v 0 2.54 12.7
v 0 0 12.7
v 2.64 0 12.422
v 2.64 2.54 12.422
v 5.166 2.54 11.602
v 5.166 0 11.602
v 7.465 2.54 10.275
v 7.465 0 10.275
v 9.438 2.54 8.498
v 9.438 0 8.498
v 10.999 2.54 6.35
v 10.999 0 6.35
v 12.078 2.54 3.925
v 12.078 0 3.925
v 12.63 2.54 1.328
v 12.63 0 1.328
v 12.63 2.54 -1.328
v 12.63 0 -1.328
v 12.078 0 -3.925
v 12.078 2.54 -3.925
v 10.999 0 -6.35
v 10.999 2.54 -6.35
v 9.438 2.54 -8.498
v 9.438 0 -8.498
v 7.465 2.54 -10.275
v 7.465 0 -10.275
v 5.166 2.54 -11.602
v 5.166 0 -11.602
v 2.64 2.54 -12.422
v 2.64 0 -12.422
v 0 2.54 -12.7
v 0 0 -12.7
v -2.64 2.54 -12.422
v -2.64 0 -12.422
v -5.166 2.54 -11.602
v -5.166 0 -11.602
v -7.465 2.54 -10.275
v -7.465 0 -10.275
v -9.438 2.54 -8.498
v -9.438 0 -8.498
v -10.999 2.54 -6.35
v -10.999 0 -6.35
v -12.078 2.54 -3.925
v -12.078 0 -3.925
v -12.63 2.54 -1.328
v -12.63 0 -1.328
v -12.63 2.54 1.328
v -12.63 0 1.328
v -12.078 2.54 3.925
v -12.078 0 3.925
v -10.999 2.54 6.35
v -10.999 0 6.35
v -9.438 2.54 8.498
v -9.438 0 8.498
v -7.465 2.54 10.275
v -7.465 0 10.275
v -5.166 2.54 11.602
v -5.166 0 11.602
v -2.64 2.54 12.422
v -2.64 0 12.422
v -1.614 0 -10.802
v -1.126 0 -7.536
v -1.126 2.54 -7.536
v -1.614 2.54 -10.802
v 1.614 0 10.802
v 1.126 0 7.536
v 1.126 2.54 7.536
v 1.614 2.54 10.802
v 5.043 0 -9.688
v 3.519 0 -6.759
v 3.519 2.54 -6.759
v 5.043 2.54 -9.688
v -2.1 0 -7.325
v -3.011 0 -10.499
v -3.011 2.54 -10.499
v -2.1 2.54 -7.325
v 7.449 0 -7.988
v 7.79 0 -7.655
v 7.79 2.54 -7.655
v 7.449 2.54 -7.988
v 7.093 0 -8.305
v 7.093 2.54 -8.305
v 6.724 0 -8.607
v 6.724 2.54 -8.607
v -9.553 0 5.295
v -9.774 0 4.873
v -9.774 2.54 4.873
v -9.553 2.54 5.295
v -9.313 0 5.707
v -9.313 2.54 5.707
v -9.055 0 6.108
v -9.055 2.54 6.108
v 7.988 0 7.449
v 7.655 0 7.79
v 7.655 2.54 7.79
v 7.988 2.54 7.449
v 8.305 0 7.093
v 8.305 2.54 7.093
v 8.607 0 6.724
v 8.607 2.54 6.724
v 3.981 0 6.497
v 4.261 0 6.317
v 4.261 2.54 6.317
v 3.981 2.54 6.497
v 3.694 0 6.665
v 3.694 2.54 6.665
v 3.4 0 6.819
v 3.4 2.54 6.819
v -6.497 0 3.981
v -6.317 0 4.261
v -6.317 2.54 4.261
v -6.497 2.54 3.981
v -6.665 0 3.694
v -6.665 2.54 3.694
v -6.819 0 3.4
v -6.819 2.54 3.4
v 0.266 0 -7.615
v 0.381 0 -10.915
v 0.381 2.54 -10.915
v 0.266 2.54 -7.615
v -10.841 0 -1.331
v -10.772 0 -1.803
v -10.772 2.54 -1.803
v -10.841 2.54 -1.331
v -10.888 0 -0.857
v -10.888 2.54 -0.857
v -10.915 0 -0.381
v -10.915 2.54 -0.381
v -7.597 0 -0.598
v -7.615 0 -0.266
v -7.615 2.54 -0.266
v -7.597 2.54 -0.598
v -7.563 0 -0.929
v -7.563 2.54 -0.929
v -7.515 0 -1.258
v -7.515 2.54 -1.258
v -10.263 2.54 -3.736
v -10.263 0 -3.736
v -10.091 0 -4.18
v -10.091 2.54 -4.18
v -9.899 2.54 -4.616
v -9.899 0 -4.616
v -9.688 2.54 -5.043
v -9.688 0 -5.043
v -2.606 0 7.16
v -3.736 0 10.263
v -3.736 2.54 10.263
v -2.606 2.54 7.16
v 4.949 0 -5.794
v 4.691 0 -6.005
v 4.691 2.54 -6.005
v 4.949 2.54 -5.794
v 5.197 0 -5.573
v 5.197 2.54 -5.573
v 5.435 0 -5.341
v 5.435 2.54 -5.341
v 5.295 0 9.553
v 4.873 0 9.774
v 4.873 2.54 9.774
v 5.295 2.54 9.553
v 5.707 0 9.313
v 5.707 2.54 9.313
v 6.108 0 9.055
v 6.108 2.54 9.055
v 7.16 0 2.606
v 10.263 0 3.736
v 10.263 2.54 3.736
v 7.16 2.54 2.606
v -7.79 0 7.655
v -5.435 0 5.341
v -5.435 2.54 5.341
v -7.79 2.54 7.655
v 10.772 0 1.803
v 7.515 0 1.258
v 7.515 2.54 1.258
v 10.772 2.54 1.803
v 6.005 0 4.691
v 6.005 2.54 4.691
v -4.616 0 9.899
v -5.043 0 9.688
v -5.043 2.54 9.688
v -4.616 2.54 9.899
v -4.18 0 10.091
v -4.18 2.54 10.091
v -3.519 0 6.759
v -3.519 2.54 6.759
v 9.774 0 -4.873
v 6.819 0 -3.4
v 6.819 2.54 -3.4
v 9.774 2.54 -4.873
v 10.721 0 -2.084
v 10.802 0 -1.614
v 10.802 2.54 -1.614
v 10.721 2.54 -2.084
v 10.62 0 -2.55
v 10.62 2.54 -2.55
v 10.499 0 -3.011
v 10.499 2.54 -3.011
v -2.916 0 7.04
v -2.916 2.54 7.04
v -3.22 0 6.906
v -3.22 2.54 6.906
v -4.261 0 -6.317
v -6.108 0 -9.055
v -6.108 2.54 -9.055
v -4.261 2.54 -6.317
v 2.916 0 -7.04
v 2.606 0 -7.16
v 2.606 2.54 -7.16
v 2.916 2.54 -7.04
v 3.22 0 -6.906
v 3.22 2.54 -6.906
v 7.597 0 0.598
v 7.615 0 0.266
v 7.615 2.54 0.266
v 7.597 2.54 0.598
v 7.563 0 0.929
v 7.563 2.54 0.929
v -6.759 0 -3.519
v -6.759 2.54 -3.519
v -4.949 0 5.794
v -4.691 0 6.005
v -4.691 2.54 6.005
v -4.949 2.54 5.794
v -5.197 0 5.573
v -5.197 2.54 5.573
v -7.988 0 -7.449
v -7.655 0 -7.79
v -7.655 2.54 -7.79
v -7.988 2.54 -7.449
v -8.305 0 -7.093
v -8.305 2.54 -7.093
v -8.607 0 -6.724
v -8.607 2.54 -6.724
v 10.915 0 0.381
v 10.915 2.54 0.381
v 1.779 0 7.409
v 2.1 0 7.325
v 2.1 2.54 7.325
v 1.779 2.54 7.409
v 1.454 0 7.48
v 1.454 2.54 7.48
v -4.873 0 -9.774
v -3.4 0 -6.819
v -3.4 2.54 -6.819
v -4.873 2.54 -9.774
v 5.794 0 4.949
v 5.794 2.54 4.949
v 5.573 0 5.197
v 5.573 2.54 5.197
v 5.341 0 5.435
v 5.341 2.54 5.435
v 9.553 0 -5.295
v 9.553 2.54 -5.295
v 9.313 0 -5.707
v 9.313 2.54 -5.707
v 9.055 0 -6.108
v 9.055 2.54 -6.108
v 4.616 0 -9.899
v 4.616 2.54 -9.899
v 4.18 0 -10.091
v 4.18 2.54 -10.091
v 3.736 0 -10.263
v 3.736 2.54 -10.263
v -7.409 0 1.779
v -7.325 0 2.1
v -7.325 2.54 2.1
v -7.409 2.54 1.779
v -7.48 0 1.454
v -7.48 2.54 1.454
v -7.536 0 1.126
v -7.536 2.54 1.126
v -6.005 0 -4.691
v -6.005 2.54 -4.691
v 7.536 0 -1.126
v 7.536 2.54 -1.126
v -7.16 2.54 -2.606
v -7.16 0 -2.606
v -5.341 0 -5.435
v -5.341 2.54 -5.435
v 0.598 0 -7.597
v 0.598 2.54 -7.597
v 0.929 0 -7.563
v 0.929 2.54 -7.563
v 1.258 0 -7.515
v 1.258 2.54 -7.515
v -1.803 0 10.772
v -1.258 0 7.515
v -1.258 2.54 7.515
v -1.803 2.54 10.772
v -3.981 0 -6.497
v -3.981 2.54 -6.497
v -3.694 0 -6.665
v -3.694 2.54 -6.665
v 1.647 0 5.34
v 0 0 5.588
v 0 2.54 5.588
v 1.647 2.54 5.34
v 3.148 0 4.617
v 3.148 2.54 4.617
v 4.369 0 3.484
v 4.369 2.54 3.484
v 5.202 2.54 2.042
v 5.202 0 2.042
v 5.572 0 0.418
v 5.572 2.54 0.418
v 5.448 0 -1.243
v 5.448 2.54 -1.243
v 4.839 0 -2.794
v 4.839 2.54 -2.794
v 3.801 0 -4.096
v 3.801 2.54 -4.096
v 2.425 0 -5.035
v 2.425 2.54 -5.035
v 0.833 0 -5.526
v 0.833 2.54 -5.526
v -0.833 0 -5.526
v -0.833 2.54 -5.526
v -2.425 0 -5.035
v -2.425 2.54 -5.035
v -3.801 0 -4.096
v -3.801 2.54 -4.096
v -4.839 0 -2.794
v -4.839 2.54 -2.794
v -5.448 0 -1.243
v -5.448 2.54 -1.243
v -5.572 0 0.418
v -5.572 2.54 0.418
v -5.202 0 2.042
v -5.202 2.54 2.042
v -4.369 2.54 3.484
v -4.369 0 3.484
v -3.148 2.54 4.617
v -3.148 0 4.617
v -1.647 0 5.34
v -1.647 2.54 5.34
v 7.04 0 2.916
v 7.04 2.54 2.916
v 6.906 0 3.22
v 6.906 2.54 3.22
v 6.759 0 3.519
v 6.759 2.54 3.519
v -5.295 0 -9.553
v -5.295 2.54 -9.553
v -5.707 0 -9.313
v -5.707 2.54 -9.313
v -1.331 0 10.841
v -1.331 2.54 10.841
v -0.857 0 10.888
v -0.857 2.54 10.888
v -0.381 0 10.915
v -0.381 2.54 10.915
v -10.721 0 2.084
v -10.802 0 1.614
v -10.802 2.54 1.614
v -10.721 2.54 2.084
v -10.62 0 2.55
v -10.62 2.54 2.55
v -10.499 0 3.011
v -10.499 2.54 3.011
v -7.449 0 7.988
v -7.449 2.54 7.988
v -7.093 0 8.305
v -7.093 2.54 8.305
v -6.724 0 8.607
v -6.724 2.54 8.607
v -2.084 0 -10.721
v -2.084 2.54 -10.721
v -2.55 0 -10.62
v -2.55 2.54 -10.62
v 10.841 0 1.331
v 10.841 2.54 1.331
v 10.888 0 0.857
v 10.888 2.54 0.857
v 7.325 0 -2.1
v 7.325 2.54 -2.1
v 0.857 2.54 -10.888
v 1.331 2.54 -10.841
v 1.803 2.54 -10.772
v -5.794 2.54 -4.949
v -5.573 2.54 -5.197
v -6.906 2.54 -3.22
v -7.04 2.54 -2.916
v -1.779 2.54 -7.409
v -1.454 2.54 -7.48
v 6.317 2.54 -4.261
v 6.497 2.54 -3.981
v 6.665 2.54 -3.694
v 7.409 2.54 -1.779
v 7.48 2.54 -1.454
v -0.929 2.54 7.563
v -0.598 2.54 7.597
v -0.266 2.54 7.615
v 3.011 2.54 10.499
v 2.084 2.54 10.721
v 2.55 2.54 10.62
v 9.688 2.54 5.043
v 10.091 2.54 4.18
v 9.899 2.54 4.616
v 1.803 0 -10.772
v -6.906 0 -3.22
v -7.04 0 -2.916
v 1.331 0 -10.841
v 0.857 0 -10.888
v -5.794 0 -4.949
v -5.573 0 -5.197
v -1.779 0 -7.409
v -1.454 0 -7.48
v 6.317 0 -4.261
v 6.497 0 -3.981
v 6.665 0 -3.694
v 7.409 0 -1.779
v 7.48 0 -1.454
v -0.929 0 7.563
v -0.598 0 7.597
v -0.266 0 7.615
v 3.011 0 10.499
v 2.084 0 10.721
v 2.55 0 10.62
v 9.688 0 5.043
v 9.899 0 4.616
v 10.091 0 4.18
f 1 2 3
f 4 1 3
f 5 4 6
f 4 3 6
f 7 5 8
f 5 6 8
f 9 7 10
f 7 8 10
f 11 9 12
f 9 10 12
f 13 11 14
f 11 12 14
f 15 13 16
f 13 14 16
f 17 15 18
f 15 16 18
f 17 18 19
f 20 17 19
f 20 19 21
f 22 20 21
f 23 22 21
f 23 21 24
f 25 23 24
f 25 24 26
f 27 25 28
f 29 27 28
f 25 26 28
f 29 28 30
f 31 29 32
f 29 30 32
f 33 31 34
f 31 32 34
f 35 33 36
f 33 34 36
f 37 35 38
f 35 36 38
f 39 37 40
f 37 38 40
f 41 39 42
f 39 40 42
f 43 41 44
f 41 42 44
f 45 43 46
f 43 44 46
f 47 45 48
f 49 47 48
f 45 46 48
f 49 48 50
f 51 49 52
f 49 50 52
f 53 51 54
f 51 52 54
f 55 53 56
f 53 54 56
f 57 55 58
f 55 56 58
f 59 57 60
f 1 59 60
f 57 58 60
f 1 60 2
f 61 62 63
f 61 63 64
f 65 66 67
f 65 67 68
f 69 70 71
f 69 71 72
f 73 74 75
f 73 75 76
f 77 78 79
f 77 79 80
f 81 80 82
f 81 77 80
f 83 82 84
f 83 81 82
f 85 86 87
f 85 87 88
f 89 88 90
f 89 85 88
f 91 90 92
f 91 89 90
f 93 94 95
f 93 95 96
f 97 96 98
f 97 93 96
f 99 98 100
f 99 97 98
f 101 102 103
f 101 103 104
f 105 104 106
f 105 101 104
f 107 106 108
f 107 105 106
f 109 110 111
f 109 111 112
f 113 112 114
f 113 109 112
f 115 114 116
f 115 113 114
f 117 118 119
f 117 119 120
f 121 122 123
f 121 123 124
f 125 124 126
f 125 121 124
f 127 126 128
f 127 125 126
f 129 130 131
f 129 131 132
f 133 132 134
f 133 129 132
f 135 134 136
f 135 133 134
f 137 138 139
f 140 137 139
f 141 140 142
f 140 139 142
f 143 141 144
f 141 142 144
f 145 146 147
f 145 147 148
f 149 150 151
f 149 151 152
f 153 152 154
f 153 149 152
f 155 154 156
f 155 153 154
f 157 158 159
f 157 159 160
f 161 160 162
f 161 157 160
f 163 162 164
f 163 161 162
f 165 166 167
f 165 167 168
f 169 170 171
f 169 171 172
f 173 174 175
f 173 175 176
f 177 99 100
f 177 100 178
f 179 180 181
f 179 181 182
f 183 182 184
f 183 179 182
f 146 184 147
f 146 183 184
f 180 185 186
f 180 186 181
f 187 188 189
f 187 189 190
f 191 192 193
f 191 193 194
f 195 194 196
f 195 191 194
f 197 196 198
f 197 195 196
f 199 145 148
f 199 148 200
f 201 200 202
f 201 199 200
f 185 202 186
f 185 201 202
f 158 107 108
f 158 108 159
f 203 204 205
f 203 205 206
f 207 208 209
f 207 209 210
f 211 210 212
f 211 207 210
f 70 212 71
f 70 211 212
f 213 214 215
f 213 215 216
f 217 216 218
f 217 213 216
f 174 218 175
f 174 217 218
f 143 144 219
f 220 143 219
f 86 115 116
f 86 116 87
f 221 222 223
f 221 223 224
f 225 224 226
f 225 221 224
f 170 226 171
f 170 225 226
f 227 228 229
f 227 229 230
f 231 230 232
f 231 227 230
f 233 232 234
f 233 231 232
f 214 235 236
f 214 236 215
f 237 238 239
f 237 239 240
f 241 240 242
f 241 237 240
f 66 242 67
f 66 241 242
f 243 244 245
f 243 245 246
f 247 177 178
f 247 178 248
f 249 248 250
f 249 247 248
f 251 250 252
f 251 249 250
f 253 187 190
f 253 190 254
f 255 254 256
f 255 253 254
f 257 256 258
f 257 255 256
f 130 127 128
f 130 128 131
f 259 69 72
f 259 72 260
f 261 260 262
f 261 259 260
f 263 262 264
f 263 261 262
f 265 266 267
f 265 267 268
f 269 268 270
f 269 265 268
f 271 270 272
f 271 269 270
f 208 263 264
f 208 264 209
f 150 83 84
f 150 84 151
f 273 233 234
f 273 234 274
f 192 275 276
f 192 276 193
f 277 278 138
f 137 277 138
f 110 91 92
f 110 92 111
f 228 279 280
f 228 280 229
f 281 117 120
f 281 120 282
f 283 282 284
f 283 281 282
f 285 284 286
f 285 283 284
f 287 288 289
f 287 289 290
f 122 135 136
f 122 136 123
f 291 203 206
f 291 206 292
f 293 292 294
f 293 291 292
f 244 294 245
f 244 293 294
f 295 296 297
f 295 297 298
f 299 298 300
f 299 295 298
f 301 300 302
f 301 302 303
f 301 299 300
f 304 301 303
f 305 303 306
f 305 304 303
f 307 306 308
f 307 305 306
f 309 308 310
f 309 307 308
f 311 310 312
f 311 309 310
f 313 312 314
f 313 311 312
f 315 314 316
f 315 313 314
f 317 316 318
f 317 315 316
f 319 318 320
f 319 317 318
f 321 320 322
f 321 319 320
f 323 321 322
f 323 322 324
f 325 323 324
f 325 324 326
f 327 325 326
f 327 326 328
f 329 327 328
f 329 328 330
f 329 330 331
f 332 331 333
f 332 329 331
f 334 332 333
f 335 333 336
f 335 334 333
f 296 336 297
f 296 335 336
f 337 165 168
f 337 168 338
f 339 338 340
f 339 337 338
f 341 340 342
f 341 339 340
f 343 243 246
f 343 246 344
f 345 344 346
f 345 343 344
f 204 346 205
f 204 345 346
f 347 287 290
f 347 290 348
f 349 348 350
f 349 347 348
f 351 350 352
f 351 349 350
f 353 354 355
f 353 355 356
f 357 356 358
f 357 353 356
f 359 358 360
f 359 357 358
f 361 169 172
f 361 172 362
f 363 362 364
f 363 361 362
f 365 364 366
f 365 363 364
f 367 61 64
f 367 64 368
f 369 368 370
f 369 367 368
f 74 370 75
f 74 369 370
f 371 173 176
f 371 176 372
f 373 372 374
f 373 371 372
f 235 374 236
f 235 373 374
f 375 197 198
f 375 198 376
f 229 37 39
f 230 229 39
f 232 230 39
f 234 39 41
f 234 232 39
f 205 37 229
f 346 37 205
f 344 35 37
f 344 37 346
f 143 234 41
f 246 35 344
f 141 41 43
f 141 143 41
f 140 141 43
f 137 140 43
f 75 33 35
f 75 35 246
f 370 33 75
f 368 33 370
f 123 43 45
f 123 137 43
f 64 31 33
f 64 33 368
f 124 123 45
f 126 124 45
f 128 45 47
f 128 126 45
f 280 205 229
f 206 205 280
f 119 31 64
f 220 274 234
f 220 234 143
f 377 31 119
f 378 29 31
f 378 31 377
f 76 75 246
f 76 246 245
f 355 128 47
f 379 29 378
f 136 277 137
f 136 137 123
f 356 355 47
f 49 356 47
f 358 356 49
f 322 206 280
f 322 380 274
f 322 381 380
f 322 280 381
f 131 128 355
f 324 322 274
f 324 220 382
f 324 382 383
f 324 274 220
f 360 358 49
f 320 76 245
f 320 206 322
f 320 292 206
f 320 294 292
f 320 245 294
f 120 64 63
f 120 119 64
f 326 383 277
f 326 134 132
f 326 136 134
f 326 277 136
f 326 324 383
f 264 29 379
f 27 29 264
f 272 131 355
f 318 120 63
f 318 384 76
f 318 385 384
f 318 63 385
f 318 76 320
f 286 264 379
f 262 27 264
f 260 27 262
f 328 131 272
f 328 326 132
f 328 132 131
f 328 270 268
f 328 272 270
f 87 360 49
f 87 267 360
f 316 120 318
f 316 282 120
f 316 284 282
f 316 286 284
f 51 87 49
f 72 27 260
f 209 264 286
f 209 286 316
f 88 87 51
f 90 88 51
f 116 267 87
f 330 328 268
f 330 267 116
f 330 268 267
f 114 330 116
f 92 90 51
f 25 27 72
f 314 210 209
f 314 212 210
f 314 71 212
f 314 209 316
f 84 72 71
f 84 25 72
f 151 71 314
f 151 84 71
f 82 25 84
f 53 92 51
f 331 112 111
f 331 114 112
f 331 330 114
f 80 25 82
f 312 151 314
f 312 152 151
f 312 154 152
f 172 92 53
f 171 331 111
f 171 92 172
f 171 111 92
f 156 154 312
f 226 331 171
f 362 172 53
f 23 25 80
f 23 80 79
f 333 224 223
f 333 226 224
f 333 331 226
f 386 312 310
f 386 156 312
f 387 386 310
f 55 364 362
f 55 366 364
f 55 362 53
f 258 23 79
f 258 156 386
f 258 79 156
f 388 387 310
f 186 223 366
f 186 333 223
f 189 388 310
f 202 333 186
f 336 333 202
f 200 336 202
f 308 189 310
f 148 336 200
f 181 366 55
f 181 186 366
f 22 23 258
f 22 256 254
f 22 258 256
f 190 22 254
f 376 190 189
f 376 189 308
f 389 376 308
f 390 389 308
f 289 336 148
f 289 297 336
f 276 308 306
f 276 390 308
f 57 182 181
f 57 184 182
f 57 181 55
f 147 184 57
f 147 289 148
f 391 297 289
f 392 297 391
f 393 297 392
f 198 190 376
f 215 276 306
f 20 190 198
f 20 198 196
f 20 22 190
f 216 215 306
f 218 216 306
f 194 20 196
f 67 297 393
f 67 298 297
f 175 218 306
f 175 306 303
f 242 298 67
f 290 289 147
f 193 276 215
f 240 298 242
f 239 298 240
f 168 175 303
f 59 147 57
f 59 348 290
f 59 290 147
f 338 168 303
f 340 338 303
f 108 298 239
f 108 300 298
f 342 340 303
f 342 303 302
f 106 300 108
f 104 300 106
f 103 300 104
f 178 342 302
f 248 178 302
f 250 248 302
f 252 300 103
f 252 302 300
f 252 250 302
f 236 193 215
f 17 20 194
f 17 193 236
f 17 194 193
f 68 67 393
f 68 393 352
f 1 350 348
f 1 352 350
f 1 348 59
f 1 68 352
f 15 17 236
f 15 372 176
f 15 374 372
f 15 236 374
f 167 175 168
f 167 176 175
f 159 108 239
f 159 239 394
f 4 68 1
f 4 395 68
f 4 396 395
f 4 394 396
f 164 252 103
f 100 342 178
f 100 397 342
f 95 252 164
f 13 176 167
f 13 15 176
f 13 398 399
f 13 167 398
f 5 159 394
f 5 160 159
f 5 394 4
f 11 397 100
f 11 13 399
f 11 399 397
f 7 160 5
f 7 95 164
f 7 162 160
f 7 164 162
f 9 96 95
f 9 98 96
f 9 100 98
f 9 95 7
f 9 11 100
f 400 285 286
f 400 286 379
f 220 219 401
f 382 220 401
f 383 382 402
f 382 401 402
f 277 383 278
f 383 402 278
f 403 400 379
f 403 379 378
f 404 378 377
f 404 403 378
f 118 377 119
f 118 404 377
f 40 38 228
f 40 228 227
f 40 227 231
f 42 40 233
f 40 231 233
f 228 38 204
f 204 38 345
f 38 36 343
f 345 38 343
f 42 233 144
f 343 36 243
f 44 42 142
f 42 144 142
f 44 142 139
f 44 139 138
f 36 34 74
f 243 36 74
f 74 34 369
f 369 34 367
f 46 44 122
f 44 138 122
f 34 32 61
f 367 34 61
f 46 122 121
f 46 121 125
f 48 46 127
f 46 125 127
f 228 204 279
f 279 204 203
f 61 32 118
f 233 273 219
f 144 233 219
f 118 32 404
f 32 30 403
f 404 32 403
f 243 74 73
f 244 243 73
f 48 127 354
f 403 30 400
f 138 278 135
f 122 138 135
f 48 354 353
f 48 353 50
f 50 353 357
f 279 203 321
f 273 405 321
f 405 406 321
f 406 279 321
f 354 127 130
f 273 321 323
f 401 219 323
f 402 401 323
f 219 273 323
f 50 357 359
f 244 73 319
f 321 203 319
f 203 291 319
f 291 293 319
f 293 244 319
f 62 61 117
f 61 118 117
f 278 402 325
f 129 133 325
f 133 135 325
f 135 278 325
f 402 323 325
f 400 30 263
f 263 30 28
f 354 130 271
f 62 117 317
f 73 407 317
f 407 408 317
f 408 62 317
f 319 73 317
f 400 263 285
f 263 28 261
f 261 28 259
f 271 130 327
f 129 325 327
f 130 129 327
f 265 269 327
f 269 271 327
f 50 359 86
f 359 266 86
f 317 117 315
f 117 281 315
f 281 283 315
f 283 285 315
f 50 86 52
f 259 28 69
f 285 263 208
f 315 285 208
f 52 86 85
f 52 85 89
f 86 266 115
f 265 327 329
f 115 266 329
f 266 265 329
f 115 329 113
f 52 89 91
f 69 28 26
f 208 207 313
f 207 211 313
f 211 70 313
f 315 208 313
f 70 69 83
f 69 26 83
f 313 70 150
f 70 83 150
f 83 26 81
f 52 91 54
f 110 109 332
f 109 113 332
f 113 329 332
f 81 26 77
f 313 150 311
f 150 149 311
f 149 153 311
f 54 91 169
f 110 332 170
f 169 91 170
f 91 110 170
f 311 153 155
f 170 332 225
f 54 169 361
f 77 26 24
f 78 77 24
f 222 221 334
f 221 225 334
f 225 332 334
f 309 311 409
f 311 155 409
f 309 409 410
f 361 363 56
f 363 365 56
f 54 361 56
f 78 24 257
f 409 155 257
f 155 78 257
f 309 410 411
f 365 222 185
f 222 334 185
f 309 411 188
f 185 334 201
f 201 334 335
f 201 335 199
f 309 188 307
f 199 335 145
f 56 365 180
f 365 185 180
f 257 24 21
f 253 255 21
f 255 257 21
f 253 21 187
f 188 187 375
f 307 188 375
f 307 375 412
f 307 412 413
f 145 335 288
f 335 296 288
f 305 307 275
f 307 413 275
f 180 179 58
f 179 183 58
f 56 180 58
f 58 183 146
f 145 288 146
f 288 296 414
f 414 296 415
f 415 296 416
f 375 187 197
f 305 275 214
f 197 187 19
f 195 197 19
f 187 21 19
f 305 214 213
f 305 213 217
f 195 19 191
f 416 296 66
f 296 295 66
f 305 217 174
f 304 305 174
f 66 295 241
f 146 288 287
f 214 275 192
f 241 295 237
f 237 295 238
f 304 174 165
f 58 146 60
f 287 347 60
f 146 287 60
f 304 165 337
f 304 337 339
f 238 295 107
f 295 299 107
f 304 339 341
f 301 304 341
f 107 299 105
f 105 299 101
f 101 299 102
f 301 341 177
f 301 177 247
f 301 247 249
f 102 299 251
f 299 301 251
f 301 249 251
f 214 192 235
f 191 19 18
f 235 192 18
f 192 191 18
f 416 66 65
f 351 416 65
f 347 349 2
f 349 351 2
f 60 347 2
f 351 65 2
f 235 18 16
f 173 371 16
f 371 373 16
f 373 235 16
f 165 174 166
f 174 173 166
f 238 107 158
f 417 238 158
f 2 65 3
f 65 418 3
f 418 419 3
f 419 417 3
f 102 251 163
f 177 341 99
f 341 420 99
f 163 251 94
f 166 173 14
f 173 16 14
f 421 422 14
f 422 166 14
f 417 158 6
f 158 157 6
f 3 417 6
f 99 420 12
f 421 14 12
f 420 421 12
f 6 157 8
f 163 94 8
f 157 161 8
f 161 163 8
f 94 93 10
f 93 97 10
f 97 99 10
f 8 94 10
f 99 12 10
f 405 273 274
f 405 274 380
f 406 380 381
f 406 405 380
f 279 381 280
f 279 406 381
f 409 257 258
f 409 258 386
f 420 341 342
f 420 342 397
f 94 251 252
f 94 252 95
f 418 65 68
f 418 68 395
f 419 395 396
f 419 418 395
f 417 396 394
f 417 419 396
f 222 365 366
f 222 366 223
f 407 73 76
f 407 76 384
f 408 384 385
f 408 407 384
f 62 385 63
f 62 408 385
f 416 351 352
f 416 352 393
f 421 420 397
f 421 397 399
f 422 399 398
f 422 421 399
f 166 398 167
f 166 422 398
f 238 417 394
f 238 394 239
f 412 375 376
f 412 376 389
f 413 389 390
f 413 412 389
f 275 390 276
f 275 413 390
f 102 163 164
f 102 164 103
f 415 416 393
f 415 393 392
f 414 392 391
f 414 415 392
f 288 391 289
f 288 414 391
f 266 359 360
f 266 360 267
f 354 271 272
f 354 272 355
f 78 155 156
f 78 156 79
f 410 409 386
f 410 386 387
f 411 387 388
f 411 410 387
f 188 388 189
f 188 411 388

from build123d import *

# Parameters (mm, degrees)
SKETCH1_R           = 12.7
SKETCH1_R_2         = 5.588
BOSS_EXTRUDE1_DEPTH = 2.54


with BuildPart() as part:
    # Sketch1 → Boss-Extrude1 (new body)
    with BuildSketch(Plane(origin=(0, 0, 0), x_dir=(1, 0, 0), z_dir=(0, 1, 0))):
        with Locations(Location((0, 0, 0), (0, 0, 270))):
            Circle(SKETCH1_R)
        with Locations(Location((0, 0, 0), (0, 0, 270))):
            Circle(SKETCH1_R_2, mode=Mode.SUBTRACT)
        with BuildLine():
            Line((-9.68793232, 5.043218354), (-6.759022549, 3.518524433))
            ThreePointArc((-6.759022549, 3.518524433), (-6.974673471, 3.068929777), (-7.16045777, 2.606193492))
            Line((-7.16045777, 2.606193492), (-10.263322804, 3.735544005))
            ThreePointArc((-10.263322804, 3.735544005), (-9.997031975, 4.398799347), (-9.68793232, 5.043218354))
        make_face(mode=Mode.SUBTRACT)
        with BuildLine():
            Line((-8.606653451, 6.724254634), (-6.004641942, 4.691340442))
            ThreePointArc((-6.004641942, 4.691340442), (-5.684957198, 5.074018295), (-5.340928594, 5.434968423))
            Line((-5.340928594, 5.434968423), (-7.655330985, 7.790121406))
            ThreePointArc((-7.655330985, 7.790121406), (-8.14843865, 7.272759556), (-8.606653451, 6.724254634))
        make_face(mode=Mode.SUBTRACT)
        with BuildLine():
            Line((-6.107504892, 9.054748367), (-4.261049924, 6.317266303))
            ThreePointArc((-4.261049924, 6.317266303), (-3.838757705, 6.58242655), (-3.400027336, 6.819399835))
            Line((-3.400027336, 6.819399835), (-4.873372515, 9.774473097))
            ThreePointArc((-4.873372515, 9.774473097), (-5.502219377, 9.434811388), (-6.107504892, 9.054748367))
        make_face(mode=Mode.SUBTRACT)
        with BuildLine():
            Line((-3.0105112, 10.498900243), (-2.100356651, 7.324814123))
            ThreePointArc((-2.100356651, 7.324814123), (-1.616793862, 7.446501031), (-1.126307713, 7.536300879))
            Line((-1.126307713, 7.536300879), (-1.614374388, 10.80203126))
            ThreePointArc((-1.614374388, 10.80203126), (-2.317404535, 10.673318145), (-3.0105112, 10.498900243))
        make_face(mode=Mode.SUBTRACT)
        with BuildLine():
            Line((0.381172303, 10.915346613), (0.265934165, 7.615358102))
            ThreePointArc((0.265934165, 7.615358102), (0.763433029, 7.581660109), (1.257662757, 7.515496284))
            Line((1.257662757, 7.515496284), (1.802649951, 10.77221134))
            ThreePointArc((1.802649951, 10.77221134), (1.094254009, 10.867046156), (0.381172303, 10.915346613))
        make_face(mode=Mode.SUBTRACT)
        with BuildLine():
            Line((3.735544005, 10.263322804), (2.606193492, 7.16045777))
            ThreePointArc((2.606193492, 7.16045777), (3.068929777, 6.974673471), (3.518524433, 6.759022549))
            Line((3.518524433, 6.759022549), (5.043218354, 9.68793232))
            ThreePointArc((5.043218354, 9.68793232), (4.398799347, 9.997031975), (3.735544005, 10.263322804))
        make_face(mode=Mode.SUBTRACT)
        with BuildLine():
            Line((6.724254634, 8.606653451), (4.691340442, 6.004641942))
            ThreePointArc((4.691340442, 6.004641942), (5.074018295, 5.684957198), (5.434968423, 5.340928594))
            Line((5.434968423, 5.340928594), (7.790121406, 7.655330985))
            ThreePointArc((7.790121406, 7.655330985), (7.272759556, 8.14843865), (6.724254634, 8.606653451))
        make_face(mode=Mode.SUBTRACT)
        with BuildLine():
            Line((9.054748367, 6.107504892), (6.317266303, 4.261049924))
            ThreePointArc((6.317266303, 4.261049924), (6.58242655, 3.838757705), (6.819399835, 3.400027336))
            Line((6.819399835, 3.400027336), (9.774473097, 4.873372515))
            ThreePointArc((9.774473097, 4.873372515), (9.434811388, 5.502219377), (9.054748367, 6.107504892))
        make_face(mode=Mode.SUBTRACT)
        with BuildLine():
            Line((10.498900243, 3.0105112), (7.324814123, 2.100356651))
            ThreePointArc((7.324814123, 2.100356651), (7.446501031, 1.616793862), (7.536300879, 1.126307713))
            Line((7.536300879, 1.126307713), (10.80203126, 1.614374388))
            ThreePointArc((10.80203126, 1.614374388), (10.673318145, 2.317404535), (10.498900243, 3.0105112))
        make_face(mode=Mode.SUBTRACT)
        with BuildLine():
            Line((10.915346613, -0.381172303), (7.615358102, -0.265934165))
            ThreePointArc((7.615358102, -0.265934165), (7.581660109, -0.763433029), (7.515496284, -1.257662757))
            Line((7.515496284, -1.257662757), (10.77221134, -1.802649951))
            ThreePointArc((10.77221134, -1.802649951), (10.867046156, -1.094254009), (10.915346613, -0.381172303))
        make_face(mode=Mode.SUBTRACT)
        with BuildLine():
            Line((10.263322804, -3.735544005), (7.16045777, -2.606193492))
            ThreePointArc((7.16045777, -2.606193492), (6.974673471, -3.068929777), (6.759022549, -3.518524433))
            Line((6.759022549, -3.518524433), (9.68793232, -5.043218354))
            ThreePointArc((9.68793232, -5.043218354), (9.997031975, -4.398799347), (10.263322804, -3.735544005))
        make_face(mode=Mode.SUBTRACT)
        with BuildLine():
            Line((8.606653451, -6.724254634), (6.004641942, -4.691340442))
            ThreePointArc((6.004641942, -4.691340442), (5.684957198, -5.074018295), (5.340928594, -5.434968423))
            Line((5.340928594, -5.434968423), (7.655330985, -7.790121406))
            ThreePointArc((7.655330985, -7.790121406), (8.14843865, -7.272759556), (8.606653451, -6.724254634))
        make_face(mode=Mode.SUBTRACT)
        with BuildLine():
            Line((6.107504892, -9.054748367), (4.261049924, -6.317266303))
            ThreePointArc((4.261049924, -6.317266303), (3.838757705, -6.58242655), (3.400027336, -6.819399835))
            Line((3.400027336, -6.819399835), (4.873372515, -9.774473097))
            ThreePointArc((4.873372515, -9.774473097), (5.502219377, -9.434811388), (6.107504892, -9.054748367))
        make_face(mode=Mode.SUBTRACT)
        with BuildLine():
            Line((3.0105112, -10.498900243), (2.100356651, -7.324814123))
            ThreePointArc((2.100356651, -7.324814123), (1.616793862, -7.446501031), (1.126307713, -7.536300879))
            Line((1.126307713, -7.536300879), (1.614374388, -10.80203126))
            ThreePointArc((1.614374388, -10.80203126), (2.317404535, -10.673318145), (3.0105112, -10.498900243))
        make_face(mode=Mode.SUBTRACT)
        with BuildLine():
            Line((-0.381172303, -10.915346613), (-0.265934165, -7.615358102))
            ThreePointArc((-0.265934165, -7.615358102), (-0.763433029, -7.581660109), (-1.257662757, -7.515496284))
            Line((-1.257662757, -7.515496284), (-1.802649951, -10.77221134))
            ThreePointArc((-1.802649951, -10.77221134), (-1.094254009, -10.867046156), (-0.381172303, -10.915346613))
        make_face(mode=Mode.SUBTRACT)
        with BuildLine():
            Line((-3.735544005, -10.263322804), (-2.606193492, -7.16045777))
            ThreePointArc((-2.606193492, -7.16045777), (-3.068929777, -6.974673471), (-3.518524433, -6.759022549))
            Line((-3.518524433, -6.759022549), (-5.043218354, -9.68793232))
            ThreePointArc((-5.043218354, -9.68793232), (-4.398799347, -9.997031975), (-3.735544005, -10.263322804))
        make_face(mode=Mode.SUBTRACT)
        with BuildLine():
            Line((-6.724254634, -8.606653451), (-4.691340442, -6.004641942))
            ThreePointArc((-4.691340442, -6.004641942), (-5.074018295, -5.684957198), (-5.434968423, -5.340928594))
            Line((-5.434968423, -5.340928594), (-7.790121406, -7.655330985))
            ThreePointArc((-7.790121406, -7.655330985), (-7.272759556, -8.14843865), (-6.724254634, -8.606653451))
        make_face(mode=Mode.SUBTRACT)
        with BuildLine():
            Line((-9.054748367, -6.107504892), (-6.317266303, -4.261049924))
            ThreePointArc((-6.317266303, -4.261049924), (-6.58242655, -3.838757705), (-6.819399835, -3.400027336))
            Line((-6.819399835, -3.400027336), (-9.774473097, -4.873372515))
            ThreePointArc((-9.774473097, -4.873372515), (-9.434811388, -5.502219377), (-9.054748367, -6.107504892))
        make_face(mode=Mode.SUBTRACT)
        with BuildLine():
            Line((-10.498900243, -3.0105112), (-7.324814123, -2.100356651))
            ThreePointArc((-7.324814123, -2.100356651), (-7.446501031, -1.616793862), (-7.536300879, -1.126307713))
            Line((-7.536300879, -1.126307713), (-10.80203126, -1.614374388))
            ThreePointArc((-10.80203126, -1.614374388), (-10.673318145, -2.317404535), (-10.498900243, -3.0105112))
        make_face(mode=Mode.SUBTRACT)
        with BuildLine():
            Line((-10.915346613, 0.381172303), (-7.615358102, 0.265934165))
            ThreePointArc((-7.615358102, 0.265934165), (-7.581660109, 0.763433029), (-7.515496284, 1.257662757))
            Line((-7.515496284, 1.257662757), (-10.77221134, 1.802649951))
            ThreePointArc((-10.77221134, 1.802649951), (-10.867046156, 1.094254009), (-10.915346613, 0.381172303))
        make_face(mode=Mode.SUBTRACT)
    extrude(amount=BOSS_EXTRUDE1_DEPTH)


solid = part.part
